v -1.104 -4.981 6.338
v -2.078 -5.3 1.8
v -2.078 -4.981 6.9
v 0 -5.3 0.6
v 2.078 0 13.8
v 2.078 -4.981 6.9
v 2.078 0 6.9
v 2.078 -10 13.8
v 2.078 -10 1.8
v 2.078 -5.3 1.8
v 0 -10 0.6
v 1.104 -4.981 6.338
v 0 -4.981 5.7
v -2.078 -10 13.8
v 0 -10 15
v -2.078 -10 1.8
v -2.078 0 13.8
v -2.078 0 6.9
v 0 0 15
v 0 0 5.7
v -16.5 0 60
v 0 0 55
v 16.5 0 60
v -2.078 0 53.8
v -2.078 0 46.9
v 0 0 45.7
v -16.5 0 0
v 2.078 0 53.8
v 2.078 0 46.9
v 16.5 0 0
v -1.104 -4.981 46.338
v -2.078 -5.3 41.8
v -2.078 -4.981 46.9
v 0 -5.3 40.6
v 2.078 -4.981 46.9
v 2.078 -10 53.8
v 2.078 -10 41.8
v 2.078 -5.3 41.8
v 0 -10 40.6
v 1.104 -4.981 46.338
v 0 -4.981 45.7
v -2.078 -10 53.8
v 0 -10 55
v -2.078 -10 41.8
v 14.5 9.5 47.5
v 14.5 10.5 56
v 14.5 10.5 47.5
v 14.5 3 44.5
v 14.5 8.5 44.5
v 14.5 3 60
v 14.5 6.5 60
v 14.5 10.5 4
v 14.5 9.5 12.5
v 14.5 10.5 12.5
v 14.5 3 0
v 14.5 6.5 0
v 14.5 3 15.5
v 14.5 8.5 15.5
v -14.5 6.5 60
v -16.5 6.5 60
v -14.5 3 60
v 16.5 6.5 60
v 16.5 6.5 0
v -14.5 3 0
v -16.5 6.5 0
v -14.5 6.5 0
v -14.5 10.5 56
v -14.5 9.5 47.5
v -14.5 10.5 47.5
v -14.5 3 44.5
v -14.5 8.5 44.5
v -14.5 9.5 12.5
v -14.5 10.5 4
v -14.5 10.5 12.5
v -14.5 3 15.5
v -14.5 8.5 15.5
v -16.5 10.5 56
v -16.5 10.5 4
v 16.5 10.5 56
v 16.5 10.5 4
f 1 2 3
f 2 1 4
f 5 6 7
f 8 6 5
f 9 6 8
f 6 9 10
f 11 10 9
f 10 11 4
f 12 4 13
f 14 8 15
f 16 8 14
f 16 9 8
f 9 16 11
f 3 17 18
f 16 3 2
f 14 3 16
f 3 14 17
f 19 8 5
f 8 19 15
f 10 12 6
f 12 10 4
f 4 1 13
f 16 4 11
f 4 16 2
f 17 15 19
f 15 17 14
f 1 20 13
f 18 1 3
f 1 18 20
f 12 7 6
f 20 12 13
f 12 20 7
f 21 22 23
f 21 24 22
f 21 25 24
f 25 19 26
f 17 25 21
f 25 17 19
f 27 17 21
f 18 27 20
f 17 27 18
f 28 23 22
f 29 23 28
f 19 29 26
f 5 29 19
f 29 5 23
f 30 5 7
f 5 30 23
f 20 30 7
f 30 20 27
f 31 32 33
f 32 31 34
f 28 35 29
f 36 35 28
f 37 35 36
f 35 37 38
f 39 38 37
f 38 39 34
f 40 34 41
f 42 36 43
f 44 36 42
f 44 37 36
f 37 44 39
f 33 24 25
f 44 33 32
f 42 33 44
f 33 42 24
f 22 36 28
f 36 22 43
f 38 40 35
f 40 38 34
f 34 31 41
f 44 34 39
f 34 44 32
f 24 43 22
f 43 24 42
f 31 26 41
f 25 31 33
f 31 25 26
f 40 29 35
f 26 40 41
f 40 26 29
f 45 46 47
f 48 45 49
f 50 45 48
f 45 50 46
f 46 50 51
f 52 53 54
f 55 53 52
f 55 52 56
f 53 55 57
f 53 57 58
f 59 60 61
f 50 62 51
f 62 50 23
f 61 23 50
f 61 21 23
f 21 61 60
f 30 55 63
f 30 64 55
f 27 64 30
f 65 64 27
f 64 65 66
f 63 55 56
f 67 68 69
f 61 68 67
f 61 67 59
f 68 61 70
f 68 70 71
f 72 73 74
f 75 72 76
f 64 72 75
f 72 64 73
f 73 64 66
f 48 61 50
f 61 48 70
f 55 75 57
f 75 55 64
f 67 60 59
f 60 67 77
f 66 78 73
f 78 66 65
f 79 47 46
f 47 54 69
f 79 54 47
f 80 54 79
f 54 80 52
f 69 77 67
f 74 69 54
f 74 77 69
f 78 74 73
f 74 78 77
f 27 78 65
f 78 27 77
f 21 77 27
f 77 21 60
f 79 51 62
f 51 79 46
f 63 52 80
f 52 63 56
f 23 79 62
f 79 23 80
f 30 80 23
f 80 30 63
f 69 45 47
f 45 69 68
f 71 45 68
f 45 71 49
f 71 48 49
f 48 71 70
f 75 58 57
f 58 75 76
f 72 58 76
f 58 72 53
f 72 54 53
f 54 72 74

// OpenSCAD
WIDTH = 29;

dinD = 7.5;
dinH = 35;
dinLip = 3;
dinT = 1;

dinW = WIDTH;

tiny = 0.01;
$fn=30;

PLATE_HEIGHT = 60;

END_CAP_THICKNESS = 2;

// Rear plate
translate([-WIDTH/2, 0, 0]) cube([WIDTH, 3, PLATE_HEIGHT]);

// Hooks
translate([0, 0, 15]) hook();
translate([0, 0, 55]) hook();

// End caps
translate([-WIDTH/2 - END_CAP_THICKNESS, 0, 0]) EndCap();
translate([WIDTH/2, 0, 0]) EndCap();

// Dinrail
translate([0, 3, PLATE_HEIGHT/2]) rotate([90,0,90]) difference() {
   /*
            7   ──── 8
               /   │  
              /    │  
             /     │  
            /      │  
           /       │  
    5  │──/  6     │  
       │           │  
       │           │  
       │           │  
       │           │  
       │           │  
       │           │  
       │           │  
    4  │───\ 3     │  
            \      │  
             \     │  
              \    │  
               \   │  
             2  ──── 1

  Edit/view: https://cascii.app/ffd9a  
  */
    translate([0, -dinH/2, -dinW/2]) linear_extrude(dinW) polygon([
      [dinD,0],                 // 1
      [dinD-dinT, 0],           // 2
      [dinD-dinT-1, dinLip],    // 3
      [0,dinLip],               // 4
      [0,dinH - dinLip],        // 5
      [dinD-dinT-1,dinH-dinLip],// 6
      [dinD-dinT, dinH],        // 7
      [dinD, dinH],             // 8
    ]);
}

module EndCap() {
/*
  2  ───────    3  
     │      \      
     │       \     
     │        \    
     │         │  4
     │         │   
     │         │   
     │         │   
     │         │   
     │         │   
     │         │   
     │         │   
     │         │   
     │         │   
     │         │   
     │         │   
     │         │   
     │         │   
     │         /  5
     │        /    
     │       /     
  1   ───── /  6   

Edit/view: https://cascii.app/e4aad
*/
  a = 4;
  w = dinD + 3;
  rotate([90,0,90]) linear_extrude(END_CAP_THICKNESS) polygon([
    [0,0],
    [0, PLATE_HEIGHT],
    [w-a, PLATE_HEIGHT],
    [w, PLATE_HEIGHT-a],
    [w, a],
    [w-a, 0],
  ]);

}
module hook() {
  // t is the amount we reduce the width/height by to let it fit ok
  t = 0.1;
  // w = width
  w = 5;
  // wt is the width less the t
  wt = w - t * 2;
  // h is the hight less a bit to make it fit
  h = 15 - 0.3;
  // h2 is the height of the smaller part of the peg
  h2 = h - 5;
  // ht is the height less t
  ht = h - t;
  // d is the depth of the board
  d = 5;
  // 12 gives us enough facets to create a easy to print angle
  $fn = 6;

  translate([0, -d*2, -wt/2]) rotate([270, 90,0]) union() {
    // The larger part of the peg
    hull() {
      cylinder(d=wt, h=d + 0.3);
      // -0.3 is the taper applied to the face that makes contact with the back on the pegboard
      translate([ht-w, 0, 0]) cylinder(d=wt, h=d -0.3);
    }
    // The smaller part of the peg
    translate([0, 0, 0]) hull() {
      cylinder(d=wt, h = d * 2);
      translate([h2 - w - t * 2 ,0 ,0]) cylinder(d=wt, h=d * 2);
      };
  }
}
